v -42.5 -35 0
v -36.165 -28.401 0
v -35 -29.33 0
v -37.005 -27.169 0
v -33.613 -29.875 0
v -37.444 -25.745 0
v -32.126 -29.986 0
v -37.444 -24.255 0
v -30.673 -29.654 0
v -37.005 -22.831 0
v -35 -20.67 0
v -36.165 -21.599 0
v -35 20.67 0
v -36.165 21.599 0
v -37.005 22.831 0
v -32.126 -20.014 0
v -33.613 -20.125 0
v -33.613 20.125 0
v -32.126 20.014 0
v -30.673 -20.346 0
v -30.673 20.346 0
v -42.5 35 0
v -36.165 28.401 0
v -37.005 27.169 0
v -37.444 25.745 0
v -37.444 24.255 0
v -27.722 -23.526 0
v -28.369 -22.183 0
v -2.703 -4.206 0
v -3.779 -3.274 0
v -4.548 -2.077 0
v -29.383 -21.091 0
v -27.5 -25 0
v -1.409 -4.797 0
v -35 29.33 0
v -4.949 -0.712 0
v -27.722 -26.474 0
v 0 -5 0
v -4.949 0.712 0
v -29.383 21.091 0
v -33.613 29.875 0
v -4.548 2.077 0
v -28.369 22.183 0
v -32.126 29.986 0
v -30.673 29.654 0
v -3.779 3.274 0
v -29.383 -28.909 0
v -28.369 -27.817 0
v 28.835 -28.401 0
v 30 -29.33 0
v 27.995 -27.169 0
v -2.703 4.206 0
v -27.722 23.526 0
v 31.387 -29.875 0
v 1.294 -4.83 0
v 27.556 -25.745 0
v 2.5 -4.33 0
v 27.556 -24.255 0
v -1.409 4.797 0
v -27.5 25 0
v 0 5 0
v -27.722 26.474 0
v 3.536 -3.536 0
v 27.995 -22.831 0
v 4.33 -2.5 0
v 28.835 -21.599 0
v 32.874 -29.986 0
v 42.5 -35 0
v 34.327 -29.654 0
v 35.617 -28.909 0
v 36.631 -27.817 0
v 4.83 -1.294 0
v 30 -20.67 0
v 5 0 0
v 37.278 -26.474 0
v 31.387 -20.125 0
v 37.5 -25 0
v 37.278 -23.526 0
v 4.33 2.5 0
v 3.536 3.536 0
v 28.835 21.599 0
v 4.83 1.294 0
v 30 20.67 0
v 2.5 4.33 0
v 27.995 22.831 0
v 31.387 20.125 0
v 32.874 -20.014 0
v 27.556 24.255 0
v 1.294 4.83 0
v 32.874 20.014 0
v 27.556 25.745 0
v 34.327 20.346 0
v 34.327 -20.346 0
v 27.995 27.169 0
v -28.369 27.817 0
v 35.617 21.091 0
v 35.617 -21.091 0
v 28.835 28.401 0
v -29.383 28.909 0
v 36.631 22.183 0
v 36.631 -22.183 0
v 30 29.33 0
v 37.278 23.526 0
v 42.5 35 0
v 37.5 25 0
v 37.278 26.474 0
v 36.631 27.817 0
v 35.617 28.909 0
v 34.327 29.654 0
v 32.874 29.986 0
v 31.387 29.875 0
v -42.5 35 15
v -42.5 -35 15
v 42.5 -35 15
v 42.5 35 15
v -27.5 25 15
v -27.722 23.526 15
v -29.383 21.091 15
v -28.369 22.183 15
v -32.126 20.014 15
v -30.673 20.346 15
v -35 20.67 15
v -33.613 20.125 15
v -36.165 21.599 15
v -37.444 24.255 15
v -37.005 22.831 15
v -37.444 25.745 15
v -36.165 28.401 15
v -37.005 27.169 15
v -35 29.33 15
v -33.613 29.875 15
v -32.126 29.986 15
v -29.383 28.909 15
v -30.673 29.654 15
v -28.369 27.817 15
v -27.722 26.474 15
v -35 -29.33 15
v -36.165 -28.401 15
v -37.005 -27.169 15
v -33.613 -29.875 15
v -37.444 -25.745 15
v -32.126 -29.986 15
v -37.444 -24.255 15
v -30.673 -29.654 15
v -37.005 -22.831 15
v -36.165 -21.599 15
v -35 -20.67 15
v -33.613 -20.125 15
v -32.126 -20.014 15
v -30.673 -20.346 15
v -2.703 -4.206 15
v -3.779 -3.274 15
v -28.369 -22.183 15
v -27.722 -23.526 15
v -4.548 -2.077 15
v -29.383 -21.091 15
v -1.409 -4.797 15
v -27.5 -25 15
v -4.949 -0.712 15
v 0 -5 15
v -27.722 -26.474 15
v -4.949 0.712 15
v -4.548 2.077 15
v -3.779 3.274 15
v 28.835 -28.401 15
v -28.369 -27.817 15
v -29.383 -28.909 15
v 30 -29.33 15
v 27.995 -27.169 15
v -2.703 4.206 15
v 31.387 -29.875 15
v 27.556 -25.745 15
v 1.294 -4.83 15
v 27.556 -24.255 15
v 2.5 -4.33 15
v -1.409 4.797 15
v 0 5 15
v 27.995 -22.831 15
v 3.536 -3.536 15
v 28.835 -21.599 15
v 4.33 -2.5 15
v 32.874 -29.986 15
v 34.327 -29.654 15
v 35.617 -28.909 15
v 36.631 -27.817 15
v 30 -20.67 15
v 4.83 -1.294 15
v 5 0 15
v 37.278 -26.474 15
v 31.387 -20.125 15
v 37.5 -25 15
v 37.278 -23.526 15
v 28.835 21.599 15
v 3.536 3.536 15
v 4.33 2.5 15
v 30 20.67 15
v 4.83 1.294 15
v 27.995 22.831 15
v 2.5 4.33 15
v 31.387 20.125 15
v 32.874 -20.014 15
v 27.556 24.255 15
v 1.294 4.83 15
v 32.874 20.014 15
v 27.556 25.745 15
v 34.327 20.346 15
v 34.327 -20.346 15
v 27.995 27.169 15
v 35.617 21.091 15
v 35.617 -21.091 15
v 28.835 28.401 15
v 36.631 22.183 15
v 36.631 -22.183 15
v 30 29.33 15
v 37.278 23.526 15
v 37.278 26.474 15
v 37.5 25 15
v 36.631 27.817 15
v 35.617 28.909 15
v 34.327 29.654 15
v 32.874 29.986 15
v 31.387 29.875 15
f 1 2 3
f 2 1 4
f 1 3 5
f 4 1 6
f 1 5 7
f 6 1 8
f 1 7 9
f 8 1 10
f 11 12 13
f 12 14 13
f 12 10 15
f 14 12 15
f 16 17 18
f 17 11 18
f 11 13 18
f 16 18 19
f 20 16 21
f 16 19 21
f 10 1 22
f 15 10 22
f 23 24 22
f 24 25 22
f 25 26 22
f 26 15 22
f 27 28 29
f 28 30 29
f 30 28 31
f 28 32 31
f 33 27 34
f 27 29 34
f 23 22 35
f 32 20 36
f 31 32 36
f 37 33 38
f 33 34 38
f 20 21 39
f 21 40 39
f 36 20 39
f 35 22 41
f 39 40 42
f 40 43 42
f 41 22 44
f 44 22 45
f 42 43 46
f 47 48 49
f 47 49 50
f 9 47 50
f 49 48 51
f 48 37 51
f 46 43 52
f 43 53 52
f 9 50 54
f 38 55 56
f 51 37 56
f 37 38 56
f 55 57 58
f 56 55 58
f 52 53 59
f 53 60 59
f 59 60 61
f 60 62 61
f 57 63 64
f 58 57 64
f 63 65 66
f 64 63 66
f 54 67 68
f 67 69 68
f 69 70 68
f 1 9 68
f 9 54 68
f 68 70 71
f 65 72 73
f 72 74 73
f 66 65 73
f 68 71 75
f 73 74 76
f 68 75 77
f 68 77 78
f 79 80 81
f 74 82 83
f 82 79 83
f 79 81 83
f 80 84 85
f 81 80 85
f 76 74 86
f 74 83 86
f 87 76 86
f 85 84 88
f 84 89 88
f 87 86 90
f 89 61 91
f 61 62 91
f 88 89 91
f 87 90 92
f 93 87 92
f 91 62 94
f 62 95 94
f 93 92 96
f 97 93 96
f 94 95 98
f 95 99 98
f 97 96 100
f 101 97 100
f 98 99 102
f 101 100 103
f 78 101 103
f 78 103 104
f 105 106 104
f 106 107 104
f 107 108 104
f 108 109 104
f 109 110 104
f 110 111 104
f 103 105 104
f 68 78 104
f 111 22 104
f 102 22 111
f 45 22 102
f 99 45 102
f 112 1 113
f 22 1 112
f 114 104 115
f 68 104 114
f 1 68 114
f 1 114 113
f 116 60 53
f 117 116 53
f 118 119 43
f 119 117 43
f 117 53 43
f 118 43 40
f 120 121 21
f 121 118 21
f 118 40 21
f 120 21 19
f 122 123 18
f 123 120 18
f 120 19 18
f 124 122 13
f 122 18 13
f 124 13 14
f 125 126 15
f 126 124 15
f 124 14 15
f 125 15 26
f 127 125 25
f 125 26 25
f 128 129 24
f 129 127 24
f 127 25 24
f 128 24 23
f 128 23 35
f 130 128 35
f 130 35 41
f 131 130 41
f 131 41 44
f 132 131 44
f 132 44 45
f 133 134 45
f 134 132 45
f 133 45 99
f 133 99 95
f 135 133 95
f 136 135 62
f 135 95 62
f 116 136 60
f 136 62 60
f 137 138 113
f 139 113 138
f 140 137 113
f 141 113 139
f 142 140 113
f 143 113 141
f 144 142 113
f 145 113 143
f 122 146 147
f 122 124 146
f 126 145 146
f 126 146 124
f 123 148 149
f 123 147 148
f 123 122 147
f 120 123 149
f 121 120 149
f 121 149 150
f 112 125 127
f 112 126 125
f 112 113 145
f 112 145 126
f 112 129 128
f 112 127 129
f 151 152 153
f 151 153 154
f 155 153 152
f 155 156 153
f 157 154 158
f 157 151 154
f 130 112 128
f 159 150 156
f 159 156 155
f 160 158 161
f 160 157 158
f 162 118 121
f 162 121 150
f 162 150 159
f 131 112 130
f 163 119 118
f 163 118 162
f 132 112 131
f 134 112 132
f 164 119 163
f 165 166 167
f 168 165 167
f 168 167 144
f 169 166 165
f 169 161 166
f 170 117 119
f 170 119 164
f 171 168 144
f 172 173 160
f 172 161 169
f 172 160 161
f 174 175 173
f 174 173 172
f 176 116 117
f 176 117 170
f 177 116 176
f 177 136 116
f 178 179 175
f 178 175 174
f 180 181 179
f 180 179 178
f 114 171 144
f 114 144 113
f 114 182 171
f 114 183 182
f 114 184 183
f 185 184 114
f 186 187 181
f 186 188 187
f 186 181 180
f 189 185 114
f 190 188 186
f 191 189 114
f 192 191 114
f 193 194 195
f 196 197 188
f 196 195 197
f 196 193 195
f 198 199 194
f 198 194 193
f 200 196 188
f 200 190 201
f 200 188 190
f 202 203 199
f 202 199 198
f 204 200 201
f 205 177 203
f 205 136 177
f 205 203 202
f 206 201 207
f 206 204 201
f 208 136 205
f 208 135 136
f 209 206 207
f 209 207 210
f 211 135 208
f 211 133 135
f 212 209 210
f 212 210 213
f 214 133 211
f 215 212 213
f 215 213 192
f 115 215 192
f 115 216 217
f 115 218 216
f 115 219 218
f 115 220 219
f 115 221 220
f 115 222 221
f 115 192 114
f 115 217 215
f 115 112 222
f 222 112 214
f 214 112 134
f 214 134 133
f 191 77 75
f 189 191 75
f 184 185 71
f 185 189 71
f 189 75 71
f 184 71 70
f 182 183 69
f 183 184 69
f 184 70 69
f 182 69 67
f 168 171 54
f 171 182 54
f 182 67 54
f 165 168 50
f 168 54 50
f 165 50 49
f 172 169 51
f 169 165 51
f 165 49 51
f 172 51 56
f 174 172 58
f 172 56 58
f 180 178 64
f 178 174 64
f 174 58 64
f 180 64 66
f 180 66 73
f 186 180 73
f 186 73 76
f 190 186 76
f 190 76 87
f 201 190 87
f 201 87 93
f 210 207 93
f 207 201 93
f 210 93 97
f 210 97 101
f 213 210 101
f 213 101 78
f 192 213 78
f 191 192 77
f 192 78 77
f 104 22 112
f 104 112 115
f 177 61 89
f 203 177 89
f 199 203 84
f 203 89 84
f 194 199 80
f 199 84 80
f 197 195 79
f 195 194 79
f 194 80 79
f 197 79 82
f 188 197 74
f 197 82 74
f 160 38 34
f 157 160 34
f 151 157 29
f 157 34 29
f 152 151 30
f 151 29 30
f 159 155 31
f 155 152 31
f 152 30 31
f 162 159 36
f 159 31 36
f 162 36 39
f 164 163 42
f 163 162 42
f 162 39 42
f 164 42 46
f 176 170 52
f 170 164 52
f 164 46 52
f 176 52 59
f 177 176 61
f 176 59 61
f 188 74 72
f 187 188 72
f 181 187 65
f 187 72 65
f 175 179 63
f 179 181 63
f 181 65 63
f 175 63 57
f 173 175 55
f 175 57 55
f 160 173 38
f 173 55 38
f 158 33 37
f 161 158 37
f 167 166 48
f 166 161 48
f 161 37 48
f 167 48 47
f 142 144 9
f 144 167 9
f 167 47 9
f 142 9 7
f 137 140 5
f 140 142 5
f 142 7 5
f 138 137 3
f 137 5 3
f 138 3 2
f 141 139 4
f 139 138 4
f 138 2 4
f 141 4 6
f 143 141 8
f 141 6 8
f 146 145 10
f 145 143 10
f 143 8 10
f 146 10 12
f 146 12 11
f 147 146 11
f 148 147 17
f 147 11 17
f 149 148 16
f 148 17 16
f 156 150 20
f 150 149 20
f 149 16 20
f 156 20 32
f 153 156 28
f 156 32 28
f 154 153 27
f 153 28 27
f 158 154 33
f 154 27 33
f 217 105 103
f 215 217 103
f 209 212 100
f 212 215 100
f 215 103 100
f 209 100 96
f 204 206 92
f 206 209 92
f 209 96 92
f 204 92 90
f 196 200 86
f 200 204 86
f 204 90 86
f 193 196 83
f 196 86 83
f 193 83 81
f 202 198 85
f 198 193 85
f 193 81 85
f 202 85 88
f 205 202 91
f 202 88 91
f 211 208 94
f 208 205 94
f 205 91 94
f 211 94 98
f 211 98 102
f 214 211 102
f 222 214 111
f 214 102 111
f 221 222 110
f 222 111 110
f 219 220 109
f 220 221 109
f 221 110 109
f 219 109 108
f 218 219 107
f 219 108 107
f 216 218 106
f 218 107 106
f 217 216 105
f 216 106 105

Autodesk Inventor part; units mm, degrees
ref_plane "YZ Plane" through (0, 0, 0) normal (1, 0, 0) x (0, 1, 0)
ref_plane "XZ Plane" through (0, 0, 0) normal (0, 1, 0) x (-1, 0, 0)
ref_plane "XY Plane" through (0, 0, 0) normal (0, 0, 1) x (1, 0, 0)
sketch "Sketch1" plane through (0, 0, 0) normal (0, 0, 1) x (1, 0, 0)
  circle A0 centre (0, 0) radius 5
  line L0 (-42.5, 35) -> (42.5, 35)
  line L1 (42.5, 35) -> (42.5, -35)
  line L2 (42.5, -35) -> (-42.5, -35)
  line L3 (-42.5, -35) -> (-42.5, 35)
  line L4 (42.5, 35) -> (-42.5, -35) construction
  line L5 (0, 15) -> (0, -15)
  circle A1 centre (-32.5, 25) radius 5
  circle A2 centre (32.5, 25) radius 5
  circle A3 centre (-32.5, -25) radius 5
  circle A4 centre (32.5, -25) radius 5
  dimension "d0" = 10
  dimension "d1" = 70
  dimension "d2" = 85
  dimension "d3" = 15
  dimension "d4" = 30
  dimension "d5" = 10
  dimension "d6" = 10
  dimension "d7" = 10
  dimension "d8" = 10
  dimension "d11" = 65
extrude "Extrusion1" add sketch "Sketch1" along normal blind 15
properties part number "dudukan u bolt" material "Steel, Mild"
